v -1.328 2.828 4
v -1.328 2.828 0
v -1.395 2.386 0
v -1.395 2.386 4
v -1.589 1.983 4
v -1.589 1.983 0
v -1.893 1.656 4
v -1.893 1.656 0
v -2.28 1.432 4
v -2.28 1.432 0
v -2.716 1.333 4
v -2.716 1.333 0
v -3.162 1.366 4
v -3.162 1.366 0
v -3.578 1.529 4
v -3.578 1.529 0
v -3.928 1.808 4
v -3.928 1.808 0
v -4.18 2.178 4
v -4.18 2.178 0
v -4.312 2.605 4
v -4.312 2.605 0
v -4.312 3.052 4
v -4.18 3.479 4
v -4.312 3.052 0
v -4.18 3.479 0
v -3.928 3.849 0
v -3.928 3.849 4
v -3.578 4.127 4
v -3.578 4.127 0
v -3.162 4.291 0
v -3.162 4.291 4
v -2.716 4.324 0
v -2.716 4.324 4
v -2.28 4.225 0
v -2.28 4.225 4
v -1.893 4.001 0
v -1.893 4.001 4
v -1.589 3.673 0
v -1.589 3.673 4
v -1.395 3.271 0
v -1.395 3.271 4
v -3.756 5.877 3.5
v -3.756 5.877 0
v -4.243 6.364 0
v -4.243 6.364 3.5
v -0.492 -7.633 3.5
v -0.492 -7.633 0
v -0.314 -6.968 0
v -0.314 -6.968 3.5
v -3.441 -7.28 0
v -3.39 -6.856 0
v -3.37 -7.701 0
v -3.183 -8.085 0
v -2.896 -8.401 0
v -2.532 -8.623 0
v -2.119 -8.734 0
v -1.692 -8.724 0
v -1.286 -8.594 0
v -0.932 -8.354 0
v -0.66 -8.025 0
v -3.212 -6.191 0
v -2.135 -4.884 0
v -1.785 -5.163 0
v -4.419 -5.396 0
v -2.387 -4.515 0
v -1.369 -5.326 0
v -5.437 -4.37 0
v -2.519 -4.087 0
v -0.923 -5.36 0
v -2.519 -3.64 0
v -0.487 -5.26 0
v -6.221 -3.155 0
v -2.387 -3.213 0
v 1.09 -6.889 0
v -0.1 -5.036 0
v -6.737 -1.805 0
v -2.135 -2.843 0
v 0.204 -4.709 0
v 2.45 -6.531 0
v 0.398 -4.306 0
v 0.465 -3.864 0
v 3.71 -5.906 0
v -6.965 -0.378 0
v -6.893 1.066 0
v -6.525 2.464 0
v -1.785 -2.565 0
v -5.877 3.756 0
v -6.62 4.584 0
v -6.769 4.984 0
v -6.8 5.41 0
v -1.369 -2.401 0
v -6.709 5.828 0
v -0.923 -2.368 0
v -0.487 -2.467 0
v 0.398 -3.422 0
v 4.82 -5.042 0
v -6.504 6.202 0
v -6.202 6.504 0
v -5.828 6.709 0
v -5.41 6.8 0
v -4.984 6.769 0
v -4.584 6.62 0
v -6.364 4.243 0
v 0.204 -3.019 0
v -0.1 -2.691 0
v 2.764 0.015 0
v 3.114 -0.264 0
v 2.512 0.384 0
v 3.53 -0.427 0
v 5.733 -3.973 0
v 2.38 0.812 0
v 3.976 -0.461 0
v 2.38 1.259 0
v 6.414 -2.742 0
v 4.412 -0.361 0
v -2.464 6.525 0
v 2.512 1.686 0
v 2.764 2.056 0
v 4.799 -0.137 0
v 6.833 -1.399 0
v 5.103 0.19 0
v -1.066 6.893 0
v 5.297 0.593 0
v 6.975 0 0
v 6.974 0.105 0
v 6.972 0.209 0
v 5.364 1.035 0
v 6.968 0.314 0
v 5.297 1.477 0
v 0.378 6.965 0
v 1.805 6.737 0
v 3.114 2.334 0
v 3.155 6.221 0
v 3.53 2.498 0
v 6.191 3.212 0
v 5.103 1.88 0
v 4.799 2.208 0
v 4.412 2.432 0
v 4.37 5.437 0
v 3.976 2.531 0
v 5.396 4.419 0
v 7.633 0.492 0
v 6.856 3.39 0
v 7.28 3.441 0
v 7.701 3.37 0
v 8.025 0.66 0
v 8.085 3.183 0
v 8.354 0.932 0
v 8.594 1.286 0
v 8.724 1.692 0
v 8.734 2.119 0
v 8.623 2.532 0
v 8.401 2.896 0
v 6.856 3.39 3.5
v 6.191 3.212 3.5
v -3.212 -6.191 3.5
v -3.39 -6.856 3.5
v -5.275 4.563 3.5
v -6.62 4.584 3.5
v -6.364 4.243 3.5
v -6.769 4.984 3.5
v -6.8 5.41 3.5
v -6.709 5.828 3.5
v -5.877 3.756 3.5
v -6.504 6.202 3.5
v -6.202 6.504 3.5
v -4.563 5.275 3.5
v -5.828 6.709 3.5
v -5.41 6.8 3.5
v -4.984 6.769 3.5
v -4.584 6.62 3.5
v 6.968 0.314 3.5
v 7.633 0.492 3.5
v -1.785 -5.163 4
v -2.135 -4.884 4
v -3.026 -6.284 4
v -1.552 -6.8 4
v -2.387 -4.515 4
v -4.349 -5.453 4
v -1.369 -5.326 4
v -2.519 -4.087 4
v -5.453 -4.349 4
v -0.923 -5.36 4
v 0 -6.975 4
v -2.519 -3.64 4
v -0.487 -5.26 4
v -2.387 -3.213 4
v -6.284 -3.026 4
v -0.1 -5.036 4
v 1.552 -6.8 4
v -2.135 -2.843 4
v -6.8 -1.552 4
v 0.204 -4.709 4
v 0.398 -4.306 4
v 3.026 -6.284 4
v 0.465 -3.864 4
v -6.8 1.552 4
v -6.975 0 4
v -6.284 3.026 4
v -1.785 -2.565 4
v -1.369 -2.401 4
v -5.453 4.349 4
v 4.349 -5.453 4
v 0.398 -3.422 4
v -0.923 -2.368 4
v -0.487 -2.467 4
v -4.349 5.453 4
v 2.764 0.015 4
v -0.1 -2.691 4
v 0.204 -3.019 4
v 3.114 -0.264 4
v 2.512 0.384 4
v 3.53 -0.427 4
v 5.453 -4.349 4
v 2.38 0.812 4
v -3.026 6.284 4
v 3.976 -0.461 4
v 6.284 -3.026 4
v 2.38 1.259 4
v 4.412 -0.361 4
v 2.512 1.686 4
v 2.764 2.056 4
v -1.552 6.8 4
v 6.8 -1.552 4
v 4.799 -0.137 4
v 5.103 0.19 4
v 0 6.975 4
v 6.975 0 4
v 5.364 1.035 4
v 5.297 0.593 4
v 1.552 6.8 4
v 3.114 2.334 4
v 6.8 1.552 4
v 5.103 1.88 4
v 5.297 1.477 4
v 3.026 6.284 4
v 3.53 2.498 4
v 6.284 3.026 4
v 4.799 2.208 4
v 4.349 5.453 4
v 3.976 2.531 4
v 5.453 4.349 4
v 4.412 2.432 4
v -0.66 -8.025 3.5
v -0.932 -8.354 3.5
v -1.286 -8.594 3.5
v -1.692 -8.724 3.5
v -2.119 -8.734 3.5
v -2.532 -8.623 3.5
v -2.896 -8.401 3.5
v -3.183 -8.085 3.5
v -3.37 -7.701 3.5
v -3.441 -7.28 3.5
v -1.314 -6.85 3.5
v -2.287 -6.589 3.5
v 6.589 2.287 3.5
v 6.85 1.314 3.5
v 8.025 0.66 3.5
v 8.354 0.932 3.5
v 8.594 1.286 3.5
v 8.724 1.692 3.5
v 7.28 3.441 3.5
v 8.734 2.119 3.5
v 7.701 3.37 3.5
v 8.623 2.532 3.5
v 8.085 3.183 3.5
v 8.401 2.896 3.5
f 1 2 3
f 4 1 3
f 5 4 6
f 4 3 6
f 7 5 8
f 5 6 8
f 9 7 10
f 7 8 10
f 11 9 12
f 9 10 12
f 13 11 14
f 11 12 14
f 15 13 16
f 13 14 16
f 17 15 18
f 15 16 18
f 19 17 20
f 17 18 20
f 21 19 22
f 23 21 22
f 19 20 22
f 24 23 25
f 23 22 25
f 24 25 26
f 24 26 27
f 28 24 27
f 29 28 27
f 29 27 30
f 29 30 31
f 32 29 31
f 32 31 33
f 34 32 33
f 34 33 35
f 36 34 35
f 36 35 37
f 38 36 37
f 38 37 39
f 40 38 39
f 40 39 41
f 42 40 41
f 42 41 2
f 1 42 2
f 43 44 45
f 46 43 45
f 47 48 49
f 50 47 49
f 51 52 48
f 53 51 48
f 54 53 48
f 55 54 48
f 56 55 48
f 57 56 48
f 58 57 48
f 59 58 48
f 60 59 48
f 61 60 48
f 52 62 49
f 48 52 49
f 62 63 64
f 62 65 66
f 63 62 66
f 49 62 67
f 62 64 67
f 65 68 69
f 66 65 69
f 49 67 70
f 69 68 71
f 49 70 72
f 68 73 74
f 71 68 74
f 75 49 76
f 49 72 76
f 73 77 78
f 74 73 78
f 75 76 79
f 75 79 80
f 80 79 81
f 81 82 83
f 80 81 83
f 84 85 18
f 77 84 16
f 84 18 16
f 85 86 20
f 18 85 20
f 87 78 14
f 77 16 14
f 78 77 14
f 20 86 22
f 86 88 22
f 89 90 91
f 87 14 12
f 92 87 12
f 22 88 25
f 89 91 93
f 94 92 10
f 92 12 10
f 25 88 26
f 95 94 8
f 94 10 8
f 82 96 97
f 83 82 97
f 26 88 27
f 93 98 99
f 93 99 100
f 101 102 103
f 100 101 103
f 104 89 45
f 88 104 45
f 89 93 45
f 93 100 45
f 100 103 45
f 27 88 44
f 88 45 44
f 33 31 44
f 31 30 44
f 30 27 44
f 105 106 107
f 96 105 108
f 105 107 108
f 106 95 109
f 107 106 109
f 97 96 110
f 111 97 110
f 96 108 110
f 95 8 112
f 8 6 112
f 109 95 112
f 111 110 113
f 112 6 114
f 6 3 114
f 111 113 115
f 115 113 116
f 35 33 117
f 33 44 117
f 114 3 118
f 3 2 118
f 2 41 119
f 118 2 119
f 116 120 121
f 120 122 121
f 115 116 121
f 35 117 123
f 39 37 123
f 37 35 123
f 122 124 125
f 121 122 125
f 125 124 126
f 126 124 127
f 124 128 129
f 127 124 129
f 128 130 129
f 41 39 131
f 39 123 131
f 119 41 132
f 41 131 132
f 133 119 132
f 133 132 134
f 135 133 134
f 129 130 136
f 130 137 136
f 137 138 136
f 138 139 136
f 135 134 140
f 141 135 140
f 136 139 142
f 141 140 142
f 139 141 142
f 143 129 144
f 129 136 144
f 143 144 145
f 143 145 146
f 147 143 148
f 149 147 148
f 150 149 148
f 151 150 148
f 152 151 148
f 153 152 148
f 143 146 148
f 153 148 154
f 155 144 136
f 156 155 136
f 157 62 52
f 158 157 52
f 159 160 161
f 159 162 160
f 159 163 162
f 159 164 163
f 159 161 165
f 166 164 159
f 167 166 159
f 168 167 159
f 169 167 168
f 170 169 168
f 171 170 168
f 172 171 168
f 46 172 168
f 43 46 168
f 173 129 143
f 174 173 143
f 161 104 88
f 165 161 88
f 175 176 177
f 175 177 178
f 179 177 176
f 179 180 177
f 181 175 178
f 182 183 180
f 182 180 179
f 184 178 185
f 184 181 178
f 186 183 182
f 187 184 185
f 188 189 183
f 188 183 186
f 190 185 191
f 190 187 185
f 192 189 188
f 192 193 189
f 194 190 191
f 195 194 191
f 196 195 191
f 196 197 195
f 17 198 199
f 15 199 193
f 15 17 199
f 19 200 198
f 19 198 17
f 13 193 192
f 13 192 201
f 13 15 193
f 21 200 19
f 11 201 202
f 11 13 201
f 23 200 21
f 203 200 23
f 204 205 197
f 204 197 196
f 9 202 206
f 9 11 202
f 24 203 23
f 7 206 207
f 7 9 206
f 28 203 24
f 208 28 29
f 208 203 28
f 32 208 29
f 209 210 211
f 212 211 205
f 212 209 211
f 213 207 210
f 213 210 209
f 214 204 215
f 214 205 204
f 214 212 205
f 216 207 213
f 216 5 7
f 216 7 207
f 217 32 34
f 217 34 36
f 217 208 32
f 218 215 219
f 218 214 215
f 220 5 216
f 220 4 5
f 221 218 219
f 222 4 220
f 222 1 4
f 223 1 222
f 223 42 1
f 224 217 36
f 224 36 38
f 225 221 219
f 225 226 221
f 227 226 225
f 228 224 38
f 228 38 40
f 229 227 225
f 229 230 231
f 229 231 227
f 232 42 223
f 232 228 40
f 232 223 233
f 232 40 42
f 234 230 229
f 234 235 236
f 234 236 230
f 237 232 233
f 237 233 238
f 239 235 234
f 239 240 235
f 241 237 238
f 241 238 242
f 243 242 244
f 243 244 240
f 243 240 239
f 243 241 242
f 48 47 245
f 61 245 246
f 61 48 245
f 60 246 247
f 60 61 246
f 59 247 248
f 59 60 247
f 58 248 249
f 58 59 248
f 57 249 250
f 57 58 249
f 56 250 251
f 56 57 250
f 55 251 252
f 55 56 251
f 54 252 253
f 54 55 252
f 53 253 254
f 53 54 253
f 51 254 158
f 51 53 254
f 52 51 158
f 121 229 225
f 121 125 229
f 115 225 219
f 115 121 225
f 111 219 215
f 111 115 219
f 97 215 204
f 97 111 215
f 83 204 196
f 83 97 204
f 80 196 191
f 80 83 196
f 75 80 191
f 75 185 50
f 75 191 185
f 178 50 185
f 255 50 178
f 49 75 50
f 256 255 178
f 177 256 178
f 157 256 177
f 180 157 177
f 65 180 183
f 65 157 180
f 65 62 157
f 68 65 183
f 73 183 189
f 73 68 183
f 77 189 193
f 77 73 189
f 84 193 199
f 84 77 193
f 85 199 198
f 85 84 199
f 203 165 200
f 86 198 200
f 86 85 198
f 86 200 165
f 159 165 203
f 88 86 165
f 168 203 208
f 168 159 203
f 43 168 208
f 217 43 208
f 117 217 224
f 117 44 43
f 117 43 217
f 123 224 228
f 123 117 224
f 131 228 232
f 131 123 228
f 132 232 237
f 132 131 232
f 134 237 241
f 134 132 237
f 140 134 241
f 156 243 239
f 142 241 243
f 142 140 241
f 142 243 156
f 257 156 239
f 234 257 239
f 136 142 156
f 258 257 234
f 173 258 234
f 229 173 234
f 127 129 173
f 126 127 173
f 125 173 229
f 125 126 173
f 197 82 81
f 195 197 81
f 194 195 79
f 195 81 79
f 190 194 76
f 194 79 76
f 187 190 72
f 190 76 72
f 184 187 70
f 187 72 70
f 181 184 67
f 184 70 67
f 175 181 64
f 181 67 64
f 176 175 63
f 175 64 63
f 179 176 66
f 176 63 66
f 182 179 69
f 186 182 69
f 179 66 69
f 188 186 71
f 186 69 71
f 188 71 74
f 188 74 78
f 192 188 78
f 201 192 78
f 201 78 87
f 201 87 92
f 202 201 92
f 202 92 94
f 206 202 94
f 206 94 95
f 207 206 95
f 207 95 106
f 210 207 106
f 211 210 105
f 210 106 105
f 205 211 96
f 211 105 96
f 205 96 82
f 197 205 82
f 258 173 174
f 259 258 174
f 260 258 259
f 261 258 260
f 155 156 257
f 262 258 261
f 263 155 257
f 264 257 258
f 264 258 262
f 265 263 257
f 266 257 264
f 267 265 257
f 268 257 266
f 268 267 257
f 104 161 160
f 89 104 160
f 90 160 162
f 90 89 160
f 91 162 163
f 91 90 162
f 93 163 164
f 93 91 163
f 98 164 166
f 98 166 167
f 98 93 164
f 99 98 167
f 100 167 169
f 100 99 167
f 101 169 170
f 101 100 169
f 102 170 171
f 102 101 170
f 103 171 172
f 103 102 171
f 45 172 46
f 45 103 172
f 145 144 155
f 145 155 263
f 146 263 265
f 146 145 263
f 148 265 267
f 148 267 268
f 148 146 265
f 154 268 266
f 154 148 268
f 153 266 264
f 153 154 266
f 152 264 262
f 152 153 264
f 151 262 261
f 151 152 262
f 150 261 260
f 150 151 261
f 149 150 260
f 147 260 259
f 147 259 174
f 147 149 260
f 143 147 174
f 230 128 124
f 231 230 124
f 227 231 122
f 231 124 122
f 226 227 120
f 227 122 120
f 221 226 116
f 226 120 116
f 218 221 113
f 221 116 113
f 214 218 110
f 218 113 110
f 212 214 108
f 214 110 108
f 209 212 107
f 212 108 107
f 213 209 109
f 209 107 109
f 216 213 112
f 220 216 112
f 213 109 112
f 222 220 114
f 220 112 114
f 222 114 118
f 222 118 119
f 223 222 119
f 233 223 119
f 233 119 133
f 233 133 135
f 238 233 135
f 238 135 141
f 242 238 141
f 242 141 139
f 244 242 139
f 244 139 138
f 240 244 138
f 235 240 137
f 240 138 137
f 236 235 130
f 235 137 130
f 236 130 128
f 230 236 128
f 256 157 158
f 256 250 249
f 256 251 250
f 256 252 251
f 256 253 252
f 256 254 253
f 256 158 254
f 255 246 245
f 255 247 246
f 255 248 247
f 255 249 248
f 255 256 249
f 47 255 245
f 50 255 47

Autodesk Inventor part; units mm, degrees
ref_plane "YZ Plane" through (0, 0, 0) normal (1, 0, 0) x (0, 1, 0)
ref_plane "XZ Plane" through (0, 0, 0) normal (0, 1, 0) x (-1, 0, 0)
ref_plane "XY Plane" through (0, 0, 0) normal (0, 0, 1) x (1, 0, 0)
sketch "スケッチ1" plane through (0, 0, 0) normal (0, 0, 1) x (1, 0, 0)
  circle A0 centre (0, 0) radius 6.975
  circle A1 centre (-2.8284, 2.8284) radius 1.5
  circle A2 centre (-1.0353, -3.8637) radius 1.5
  circle A3 centre (3.8637, 1.0353) radius 1.5
  circle A4 centre (0, 0) radius 9
  line L0 (0, 0) -> (7.2444, 1.9411) construction
  line L1 (0.3882, -1.4489) -> (7.6327, 0.4923)
  line L2 (6.8562, 3.39) -> (-0.3882, 1.4489)
  arc A5 (-0.3882, 1.4489) -> (0.3882, -1.4489) centre (0, 0) ccw
  arc A6 (7.6327, 0.4923) -> (6.8562, 3.39) centre (7.2444, 1.9411) ccw
  arc A7 (-4.2426, 6.364) -> (-6.364, 4.2426) centre (-5.3033, 5.3033) ccw
  line L3 (1.0607, 1.0607) -> (-4.2426, 6.364)
  line L4 (-6.364, 4.2426) -> (-1.0607, -1.0607)
  arc A8 (-3.39, -6.8562) -> (-0.4923, -7.6327) centre (-1.9411, -7.2444) ccw
  line L5 (-1.4489, 0.3882) -> (-3.39, -6.8562)
  line L6 (-0.4923, -7.6327) -> (1.4489, -0.3882)
  point P0 (3.6222, 0.9706)
  point P1 (6.1915, 3.2119)
  point P2 (6.9679, 0.3141)
  point P3 (-5.8773, 3.756)
  point P4 (-3.756, 5.8773)
  point P5 (-0.3141, -6.9679)
  point P6 (-3.2119, -6.1915)
  dimension "d0" = 13.95
  dimension "d1" = 3
  dimension "d2" = 4
  dimension "d5" = 360
  dimension "d9" = 18
  dimension "d14" = 3
  dimension "d17" = 360
extrude "押し出し2" add sketch "スケッチ1" along normal blind 4 contours A0 L6 L1 | L1 A3 L2 A0 | A0 L5 A2 L6 | L2 L3 A0 | L1 A5 L2 A3 | A0 L4 L5 | A2 L5 L4 A5 L1 L6 | L3 A1 L4 A0 | L3 L2 A5 L5 L4 A1 | L5 A5 L4
extrude "押し出し3" add sketch "スケッチ1" along normal blind 3.5 contours A0 L2 A6 L1 | L6 A8 L5 A0 | A0 L4 A7 L3
properties part number "アームカムFD18t4" material "アセタール樹脂、白"
